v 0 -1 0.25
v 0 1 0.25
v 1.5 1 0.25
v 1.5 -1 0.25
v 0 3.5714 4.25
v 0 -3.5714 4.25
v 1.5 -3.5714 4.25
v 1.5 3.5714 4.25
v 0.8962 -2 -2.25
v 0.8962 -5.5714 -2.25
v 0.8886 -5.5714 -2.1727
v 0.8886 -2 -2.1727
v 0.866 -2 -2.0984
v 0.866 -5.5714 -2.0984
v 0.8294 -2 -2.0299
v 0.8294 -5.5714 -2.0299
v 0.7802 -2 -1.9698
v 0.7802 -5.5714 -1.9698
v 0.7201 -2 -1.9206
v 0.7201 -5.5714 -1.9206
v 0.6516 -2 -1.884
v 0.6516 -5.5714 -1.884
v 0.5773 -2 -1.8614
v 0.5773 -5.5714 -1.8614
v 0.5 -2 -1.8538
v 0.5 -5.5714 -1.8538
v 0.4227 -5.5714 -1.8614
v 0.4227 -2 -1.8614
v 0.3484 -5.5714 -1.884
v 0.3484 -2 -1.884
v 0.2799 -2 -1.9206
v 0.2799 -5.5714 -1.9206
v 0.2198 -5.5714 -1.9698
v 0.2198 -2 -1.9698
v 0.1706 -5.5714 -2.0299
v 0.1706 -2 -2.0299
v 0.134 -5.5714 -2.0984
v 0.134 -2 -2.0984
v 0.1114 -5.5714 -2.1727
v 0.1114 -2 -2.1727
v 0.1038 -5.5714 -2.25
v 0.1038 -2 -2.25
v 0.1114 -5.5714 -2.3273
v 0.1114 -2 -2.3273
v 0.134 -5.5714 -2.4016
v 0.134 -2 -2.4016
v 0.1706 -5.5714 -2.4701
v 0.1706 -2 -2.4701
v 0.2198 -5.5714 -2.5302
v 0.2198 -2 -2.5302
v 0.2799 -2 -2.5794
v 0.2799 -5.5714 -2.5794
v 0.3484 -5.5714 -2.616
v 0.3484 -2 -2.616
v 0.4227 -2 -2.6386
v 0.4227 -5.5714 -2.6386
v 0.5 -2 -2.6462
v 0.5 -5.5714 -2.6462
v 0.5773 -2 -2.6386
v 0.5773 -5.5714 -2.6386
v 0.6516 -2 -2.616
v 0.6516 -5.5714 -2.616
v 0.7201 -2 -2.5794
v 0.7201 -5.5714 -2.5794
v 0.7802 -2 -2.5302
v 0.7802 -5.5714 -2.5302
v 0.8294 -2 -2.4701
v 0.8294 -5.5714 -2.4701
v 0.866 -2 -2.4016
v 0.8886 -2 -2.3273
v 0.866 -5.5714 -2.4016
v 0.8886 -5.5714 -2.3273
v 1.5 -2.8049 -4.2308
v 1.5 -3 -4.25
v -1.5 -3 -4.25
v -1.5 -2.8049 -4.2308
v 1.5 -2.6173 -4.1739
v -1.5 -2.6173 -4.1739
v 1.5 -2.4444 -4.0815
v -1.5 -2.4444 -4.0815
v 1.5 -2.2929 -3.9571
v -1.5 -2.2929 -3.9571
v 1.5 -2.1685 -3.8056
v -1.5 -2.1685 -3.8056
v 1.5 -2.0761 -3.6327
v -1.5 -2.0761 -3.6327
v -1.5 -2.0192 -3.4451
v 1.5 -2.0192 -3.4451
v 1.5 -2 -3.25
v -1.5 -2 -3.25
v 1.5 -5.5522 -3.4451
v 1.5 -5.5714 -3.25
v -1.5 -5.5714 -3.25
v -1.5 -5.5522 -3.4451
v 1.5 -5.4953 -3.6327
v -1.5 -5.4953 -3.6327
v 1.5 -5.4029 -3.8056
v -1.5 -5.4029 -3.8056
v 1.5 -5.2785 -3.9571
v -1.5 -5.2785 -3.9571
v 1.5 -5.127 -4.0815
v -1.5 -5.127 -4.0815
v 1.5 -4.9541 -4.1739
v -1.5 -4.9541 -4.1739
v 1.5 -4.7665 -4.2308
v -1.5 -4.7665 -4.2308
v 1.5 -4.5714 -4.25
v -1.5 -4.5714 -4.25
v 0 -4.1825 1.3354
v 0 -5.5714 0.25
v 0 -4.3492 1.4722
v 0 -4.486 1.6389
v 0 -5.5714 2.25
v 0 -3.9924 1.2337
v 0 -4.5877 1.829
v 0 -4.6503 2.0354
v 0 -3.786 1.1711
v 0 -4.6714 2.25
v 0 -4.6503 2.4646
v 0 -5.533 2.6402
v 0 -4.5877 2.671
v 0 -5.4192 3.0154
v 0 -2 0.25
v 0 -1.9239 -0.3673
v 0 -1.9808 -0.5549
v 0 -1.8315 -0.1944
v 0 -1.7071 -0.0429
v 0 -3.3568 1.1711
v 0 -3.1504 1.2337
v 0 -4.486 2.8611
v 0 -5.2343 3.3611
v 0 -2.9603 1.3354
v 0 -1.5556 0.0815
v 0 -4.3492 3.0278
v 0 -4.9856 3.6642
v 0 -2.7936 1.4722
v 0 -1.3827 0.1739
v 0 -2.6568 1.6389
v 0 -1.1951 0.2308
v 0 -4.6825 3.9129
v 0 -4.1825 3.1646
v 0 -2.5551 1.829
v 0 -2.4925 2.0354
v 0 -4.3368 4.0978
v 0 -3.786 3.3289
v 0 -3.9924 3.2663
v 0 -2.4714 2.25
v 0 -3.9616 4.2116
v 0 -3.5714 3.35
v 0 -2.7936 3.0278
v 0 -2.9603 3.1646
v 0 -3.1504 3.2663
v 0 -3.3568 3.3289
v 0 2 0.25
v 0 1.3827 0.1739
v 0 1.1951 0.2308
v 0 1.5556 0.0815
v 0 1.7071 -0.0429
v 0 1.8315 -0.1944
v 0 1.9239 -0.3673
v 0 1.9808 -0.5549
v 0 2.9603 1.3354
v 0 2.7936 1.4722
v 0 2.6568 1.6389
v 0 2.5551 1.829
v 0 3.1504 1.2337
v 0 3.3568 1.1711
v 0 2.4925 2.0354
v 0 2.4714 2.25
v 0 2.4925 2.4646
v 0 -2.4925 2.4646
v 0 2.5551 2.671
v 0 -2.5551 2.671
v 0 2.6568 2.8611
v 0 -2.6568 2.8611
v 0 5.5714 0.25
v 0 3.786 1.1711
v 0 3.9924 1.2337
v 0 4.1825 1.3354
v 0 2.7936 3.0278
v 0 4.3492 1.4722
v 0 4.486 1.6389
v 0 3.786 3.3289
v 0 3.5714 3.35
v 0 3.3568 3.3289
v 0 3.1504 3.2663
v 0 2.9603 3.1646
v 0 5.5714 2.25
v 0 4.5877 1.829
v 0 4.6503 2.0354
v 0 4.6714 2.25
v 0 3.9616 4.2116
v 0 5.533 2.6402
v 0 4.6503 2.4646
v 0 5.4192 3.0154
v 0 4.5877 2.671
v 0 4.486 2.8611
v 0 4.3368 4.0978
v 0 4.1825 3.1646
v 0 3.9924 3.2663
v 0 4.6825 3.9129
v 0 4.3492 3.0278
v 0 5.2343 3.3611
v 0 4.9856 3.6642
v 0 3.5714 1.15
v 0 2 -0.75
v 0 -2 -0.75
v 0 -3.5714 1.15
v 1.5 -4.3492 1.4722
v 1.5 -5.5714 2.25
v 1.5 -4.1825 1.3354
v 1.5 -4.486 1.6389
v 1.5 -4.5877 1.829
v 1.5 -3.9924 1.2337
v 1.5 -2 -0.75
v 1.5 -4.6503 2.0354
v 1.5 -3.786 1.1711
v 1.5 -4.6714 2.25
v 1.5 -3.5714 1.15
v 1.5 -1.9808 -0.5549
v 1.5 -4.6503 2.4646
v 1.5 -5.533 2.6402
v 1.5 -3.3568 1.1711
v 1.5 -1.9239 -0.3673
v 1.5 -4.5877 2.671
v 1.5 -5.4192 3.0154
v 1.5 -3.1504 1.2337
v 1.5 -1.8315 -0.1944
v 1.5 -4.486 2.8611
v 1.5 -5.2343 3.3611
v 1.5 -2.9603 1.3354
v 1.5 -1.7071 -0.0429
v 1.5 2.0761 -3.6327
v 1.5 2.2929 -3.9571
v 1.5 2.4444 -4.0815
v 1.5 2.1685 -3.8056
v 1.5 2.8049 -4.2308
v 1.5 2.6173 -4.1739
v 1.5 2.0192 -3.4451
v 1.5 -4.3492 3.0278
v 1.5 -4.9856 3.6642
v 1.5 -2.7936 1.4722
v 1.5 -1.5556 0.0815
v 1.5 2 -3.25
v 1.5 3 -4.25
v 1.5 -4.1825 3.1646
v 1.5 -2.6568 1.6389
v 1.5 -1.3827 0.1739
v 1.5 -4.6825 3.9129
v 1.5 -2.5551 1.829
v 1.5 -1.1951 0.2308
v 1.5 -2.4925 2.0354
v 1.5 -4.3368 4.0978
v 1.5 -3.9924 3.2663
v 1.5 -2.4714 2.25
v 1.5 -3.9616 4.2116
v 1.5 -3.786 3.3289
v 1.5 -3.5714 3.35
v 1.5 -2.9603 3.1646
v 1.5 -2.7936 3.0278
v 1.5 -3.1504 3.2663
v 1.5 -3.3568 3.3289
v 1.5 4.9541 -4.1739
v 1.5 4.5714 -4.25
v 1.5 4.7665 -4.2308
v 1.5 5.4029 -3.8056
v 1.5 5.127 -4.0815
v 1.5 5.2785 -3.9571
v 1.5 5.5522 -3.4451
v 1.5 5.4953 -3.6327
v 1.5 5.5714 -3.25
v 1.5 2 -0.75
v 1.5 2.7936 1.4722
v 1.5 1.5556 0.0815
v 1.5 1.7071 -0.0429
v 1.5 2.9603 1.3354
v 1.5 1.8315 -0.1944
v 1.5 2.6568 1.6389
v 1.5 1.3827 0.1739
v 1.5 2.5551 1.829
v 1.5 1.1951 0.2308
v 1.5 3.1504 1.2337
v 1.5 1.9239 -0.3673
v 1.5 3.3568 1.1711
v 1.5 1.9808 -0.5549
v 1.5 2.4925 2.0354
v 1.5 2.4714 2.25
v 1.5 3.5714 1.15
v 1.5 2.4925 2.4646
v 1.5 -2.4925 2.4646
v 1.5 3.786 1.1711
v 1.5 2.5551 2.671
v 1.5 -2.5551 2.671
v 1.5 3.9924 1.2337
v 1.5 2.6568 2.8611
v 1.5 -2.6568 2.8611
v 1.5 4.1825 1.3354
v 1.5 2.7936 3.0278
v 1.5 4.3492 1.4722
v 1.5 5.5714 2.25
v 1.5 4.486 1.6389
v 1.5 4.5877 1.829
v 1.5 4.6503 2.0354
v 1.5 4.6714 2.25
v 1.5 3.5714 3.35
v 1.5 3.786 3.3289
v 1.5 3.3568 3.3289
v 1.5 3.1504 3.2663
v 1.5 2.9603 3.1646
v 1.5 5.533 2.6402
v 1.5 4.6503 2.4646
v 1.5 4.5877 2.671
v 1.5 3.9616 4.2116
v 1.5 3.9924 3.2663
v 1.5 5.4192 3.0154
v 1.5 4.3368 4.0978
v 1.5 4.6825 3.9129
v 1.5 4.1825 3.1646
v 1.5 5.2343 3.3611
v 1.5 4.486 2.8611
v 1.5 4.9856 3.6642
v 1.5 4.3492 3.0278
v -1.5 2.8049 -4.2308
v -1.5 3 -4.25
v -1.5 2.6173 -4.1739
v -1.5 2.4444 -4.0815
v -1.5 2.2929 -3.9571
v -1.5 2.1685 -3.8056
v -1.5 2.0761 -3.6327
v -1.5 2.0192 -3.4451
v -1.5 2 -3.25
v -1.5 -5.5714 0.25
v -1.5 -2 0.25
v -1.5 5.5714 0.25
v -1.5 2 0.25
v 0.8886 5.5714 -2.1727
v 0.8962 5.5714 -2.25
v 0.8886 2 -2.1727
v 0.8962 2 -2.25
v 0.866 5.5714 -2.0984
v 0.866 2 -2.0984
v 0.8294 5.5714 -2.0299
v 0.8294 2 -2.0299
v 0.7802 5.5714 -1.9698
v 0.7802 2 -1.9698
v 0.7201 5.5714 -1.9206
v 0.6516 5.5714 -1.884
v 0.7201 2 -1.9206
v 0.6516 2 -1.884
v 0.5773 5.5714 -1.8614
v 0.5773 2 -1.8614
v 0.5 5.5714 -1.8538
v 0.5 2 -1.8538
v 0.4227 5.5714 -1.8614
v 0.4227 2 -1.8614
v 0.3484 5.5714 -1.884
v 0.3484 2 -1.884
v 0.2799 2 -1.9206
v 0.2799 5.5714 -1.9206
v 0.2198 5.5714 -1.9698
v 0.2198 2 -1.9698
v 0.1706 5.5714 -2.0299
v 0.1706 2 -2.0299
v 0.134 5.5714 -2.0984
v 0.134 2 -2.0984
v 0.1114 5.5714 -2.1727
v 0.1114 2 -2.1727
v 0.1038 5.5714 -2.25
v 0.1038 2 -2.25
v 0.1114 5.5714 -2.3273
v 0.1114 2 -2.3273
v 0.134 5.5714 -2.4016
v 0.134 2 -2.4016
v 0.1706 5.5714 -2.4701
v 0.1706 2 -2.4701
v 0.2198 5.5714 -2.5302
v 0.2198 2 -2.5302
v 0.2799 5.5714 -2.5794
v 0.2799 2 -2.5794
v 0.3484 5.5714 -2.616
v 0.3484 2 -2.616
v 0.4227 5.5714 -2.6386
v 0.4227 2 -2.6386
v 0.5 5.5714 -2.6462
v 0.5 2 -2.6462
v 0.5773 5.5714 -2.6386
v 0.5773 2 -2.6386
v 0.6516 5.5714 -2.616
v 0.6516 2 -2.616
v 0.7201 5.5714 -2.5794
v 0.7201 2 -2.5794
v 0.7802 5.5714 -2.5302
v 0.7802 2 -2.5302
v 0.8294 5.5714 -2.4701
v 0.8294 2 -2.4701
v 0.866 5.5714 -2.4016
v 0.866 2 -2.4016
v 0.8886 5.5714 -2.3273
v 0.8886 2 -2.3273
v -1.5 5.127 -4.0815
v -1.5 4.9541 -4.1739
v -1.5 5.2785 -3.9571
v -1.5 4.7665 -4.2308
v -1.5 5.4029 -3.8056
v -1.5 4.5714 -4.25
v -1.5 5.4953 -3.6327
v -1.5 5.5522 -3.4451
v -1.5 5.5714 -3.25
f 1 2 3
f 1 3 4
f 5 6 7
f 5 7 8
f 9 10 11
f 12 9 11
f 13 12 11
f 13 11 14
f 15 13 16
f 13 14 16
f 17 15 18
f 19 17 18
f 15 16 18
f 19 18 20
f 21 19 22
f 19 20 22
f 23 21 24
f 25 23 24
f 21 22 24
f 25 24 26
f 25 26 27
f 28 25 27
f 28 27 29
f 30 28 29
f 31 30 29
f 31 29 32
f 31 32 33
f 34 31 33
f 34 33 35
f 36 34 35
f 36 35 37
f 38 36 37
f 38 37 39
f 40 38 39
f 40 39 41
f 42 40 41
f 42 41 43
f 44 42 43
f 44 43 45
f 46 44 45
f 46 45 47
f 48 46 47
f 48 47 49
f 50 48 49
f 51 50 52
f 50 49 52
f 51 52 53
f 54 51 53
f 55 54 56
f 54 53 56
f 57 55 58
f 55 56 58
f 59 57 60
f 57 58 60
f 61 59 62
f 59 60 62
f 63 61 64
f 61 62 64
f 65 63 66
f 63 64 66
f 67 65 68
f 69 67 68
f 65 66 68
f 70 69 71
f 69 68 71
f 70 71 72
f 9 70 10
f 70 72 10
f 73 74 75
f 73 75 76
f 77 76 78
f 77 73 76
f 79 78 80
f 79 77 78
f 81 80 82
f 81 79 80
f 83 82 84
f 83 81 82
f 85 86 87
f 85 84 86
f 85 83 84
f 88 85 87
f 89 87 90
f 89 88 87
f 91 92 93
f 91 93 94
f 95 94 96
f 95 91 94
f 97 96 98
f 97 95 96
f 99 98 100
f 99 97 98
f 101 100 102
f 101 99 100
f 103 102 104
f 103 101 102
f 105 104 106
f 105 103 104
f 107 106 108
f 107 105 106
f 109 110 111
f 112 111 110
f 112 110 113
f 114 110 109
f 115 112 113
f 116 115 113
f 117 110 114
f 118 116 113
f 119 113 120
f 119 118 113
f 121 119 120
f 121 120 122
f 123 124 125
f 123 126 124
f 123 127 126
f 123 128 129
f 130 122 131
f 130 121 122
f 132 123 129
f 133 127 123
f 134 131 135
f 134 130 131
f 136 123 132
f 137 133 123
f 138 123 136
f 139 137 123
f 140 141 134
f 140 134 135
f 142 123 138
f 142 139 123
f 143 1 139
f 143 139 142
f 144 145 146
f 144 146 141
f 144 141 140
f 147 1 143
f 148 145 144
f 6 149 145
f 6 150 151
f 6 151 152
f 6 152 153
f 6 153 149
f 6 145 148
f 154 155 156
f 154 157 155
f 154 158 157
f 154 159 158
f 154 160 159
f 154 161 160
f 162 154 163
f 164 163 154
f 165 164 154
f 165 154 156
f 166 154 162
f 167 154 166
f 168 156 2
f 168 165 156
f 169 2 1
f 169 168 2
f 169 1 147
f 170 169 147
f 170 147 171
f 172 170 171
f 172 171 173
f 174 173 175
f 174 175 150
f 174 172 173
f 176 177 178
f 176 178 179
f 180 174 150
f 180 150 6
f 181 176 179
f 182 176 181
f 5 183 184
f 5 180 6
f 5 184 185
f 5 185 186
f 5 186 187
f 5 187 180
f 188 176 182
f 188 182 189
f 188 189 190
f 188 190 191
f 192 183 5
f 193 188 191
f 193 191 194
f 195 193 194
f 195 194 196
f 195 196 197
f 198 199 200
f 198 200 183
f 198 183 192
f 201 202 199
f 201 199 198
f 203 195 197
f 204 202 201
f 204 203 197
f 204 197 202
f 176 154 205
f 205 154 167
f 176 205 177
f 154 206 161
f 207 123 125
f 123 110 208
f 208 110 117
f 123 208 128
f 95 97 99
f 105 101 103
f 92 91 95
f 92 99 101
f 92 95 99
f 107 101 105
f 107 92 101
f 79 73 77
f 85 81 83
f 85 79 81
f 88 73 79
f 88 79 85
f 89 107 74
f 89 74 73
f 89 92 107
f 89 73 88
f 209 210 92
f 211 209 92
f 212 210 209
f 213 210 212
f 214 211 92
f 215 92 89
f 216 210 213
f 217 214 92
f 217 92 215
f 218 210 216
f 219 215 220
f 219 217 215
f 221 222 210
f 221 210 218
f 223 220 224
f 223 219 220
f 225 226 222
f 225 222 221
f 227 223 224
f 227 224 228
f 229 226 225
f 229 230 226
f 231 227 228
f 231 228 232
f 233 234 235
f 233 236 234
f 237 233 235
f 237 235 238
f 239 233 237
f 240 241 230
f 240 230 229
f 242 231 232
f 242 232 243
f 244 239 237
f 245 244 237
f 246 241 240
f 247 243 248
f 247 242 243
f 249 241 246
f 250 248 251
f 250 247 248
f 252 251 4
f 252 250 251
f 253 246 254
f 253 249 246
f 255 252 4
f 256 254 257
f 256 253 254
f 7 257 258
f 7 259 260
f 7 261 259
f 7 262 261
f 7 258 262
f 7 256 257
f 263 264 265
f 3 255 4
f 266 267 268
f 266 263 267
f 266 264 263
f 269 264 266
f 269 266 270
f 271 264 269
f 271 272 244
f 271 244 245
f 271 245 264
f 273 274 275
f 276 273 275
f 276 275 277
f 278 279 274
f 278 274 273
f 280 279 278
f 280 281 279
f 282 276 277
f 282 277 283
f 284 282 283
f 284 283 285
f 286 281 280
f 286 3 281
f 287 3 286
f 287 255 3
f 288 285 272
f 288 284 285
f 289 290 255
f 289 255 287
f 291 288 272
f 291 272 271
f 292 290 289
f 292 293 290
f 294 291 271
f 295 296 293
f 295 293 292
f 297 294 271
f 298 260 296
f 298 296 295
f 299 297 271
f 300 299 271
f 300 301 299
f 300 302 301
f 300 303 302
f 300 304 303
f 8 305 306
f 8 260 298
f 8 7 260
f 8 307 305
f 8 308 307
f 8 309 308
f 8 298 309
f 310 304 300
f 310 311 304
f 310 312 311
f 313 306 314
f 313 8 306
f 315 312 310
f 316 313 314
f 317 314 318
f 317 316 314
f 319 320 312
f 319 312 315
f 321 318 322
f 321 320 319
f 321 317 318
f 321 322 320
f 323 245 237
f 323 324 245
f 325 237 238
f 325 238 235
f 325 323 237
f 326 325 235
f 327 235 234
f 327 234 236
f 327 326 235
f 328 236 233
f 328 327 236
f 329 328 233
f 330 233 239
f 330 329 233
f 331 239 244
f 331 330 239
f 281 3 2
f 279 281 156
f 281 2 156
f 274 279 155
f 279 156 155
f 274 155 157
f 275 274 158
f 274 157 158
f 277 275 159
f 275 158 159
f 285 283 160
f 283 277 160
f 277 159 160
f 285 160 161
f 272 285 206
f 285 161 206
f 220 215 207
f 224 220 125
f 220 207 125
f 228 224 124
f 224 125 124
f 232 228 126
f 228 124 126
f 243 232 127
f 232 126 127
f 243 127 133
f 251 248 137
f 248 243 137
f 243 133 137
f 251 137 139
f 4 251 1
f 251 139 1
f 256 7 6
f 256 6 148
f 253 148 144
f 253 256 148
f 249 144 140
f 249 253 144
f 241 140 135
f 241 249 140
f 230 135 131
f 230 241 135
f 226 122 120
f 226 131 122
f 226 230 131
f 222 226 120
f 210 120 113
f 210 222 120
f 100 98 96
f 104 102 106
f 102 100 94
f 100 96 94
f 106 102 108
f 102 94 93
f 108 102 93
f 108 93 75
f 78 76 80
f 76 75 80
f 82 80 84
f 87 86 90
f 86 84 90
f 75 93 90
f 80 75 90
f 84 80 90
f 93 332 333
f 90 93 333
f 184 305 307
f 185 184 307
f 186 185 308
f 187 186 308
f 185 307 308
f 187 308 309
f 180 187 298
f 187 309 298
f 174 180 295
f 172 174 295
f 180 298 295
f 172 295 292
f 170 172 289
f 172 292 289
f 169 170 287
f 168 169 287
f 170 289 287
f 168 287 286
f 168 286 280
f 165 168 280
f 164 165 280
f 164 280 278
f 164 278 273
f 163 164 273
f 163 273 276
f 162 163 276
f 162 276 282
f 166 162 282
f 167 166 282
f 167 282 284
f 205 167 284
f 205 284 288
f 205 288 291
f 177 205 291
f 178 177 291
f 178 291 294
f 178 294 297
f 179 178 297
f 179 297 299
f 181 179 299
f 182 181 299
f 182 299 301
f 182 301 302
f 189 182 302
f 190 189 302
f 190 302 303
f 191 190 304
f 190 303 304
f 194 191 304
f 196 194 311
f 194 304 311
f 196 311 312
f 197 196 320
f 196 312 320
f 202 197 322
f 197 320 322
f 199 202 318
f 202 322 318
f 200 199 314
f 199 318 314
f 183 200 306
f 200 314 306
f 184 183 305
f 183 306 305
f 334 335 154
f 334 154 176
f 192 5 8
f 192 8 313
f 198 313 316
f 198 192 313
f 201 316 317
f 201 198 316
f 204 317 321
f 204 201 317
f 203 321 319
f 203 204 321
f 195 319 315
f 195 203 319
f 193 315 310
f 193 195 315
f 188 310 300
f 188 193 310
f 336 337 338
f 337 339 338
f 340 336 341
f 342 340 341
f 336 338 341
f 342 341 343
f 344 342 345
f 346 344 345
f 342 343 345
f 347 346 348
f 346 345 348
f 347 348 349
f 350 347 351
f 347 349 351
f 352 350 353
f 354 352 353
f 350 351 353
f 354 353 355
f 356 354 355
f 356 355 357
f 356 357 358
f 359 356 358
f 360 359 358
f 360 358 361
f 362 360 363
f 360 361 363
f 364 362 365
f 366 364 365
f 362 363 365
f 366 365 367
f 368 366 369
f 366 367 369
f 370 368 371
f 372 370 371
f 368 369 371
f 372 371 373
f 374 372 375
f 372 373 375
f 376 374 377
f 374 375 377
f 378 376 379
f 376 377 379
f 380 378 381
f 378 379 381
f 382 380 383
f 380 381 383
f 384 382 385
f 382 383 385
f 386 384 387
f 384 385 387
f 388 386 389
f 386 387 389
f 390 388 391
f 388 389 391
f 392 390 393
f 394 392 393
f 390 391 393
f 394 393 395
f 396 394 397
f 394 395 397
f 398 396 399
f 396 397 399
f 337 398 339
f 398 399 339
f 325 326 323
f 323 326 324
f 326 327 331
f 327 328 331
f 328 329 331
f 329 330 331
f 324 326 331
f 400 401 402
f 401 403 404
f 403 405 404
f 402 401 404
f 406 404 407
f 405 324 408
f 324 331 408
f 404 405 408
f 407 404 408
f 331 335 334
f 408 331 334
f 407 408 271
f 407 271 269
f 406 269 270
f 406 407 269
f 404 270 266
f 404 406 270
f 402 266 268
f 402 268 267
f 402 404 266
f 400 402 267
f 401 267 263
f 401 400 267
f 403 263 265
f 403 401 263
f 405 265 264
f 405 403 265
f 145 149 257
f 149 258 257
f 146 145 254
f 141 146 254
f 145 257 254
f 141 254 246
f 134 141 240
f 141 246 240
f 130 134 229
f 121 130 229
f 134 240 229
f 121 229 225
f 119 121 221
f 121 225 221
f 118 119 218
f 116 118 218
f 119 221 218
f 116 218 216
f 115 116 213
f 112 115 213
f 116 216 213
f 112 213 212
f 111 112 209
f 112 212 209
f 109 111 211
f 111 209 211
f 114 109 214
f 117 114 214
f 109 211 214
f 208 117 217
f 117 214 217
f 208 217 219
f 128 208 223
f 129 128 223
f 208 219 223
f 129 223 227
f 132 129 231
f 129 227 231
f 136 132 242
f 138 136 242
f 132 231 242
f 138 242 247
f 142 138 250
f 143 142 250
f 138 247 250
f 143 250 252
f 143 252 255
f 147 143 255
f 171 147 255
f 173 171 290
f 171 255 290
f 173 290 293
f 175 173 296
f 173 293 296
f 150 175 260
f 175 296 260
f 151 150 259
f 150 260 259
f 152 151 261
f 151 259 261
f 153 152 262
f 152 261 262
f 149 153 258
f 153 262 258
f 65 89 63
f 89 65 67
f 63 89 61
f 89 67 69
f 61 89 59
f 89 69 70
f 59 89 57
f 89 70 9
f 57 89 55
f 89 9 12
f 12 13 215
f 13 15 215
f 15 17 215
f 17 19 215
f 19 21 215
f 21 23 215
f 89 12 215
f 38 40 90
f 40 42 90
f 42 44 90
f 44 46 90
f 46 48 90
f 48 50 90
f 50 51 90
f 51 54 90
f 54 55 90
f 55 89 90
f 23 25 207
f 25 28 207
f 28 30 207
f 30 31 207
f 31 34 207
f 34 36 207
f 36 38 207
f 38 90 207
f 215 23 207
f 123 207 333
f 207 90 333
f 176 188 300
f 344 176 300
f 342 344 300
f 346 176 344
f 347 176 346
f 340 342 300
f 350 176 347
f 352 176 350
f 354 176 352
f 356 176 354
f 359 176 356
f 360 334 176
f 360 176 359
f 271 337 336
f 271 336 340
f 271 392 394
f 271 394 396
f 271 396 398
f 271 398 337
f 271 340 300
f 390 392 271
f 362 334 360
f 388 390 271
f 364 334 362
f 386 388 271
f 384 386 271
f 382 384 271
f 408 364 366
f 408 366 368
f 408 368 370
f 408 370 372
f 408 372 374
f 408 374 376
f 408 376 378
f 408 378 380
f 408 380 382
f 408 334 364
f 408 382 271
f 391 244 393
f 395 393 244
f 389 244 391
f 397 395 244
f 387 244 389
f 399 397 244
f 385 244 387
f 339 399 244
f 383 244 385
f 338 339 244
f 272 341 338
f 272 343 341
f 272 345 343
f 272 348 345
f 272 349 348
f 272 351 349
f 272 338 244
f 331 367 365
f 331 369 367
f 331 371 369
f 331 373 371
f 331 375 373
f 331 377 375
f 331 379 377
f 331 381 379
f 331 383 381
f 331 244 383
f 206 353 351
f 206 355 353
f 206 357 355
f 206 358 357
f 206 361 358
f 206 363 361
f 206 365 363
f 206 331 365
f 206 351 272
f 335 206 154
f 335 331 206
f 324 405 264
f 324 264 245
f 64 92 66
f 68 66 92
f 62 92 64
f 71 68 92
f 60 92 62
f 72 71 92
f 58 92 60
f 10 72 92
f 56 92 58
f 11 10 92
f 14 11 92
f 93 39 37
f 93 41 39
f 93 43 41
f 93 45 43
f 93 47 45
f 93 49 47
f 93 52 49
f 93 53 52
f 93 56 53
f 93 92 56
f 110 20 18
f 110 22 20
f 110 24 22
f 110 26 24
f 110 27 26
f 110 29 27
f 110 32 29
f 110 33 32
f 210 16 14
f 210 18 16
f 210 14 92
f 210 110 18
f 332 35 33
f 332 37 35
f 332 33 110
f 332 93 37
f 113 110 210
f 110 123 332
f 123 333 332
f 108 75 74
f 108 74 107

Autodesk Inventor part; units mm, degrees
ref_plane "YZ Plane" through (0, 0, 0) normal (1, 0, 0) x (0, 1, 0)
ref_plane "XZ Plane" through (0, 0, 0) normal (0, 1, 0) x (-1, 0, 0)
ref_plane "XY Plane" through (0, 0, 0) normal (0, 0, 1) x (1, 0, 0)
sketch "Sketch1" plane through (0, 0, 0) normal (1, 0, 0) x (0, 1, 0)
  line L0 (-5.5714, 4.25) -> (5.5714, 4.25)
  line L1 (5.5714, 4.25) -> (5.5714, -4.25)
  line L2 (5.5714, -4.25) -> (-5.5714, -4.25)
  line L3 (-5.5714, -4.25) -> (-5.5714, 4.25)
  line L4 (-5.5714, 0.25) -> (5.5714, 0.25) construction
  circle A0 centre (-3.5714, 2.25) radius 2 construction
  line L5 (-2, -4.25) -> (2, -4.25)
  line L6 (2, -4.25) -> (2, 0.25)
  line L7 (2, 0.25) -> (-2, 0.25)
  line L8 (-2, 0.25) -> (-2, -4.25)
  circle A1 centre (3.5714, 2.25) radius 2 construction
  circle A2 centre (0, 36.35) radius 39 construction
  line L9 (-5.5714, -2.25) -> (5.5714, -2.25) construction
  point P0 (0, 0)
  point P1 (-5.5714, 0)
  point P2 (0, -4.25)
  dimension "d0" = 4
  dimension "d1" = 4.5
  dimension "d2" = 11.1427
  dimension "d15" = 4
  dimension "d34" = 78
  dimension "d35" = 38.6
  dimension "d36" = 4.5
extrude "Extrusion1" add sketch "Sketch1" along normal mid plane 3 contours L0 L1 L2 L6 L7 L8 L3
sketch "Sketch4" plane through (-1.5, -5.5714, -4.25) normal (0, -1, 0) x (1, 0, 0)
  line L0 (0, 8.5) -> (3, 8.5) projected
  line L1 (0, 0) -> (0, 8.5) projected
  line L2 (3, 0) -> (0, 0) projected
  line L3 (3, 8.5) -> (3, 0) projected
  circle A0 centre (2, 2) radius 0.3962
  point P0 (1.5, 4.25)
  dimension "d16" = 0.7925
  dimension "d24" = 2
  dimension "d25" = 6.5
extrude "Extrusion3" cut sketch "Sketch4" against normal through all contours A0
fillet "Fillet1" radius 1 6 edges at (0, 2, 0.25) (0, -2, 0.25) (0, 2, -4.25) (0, -2, -4.25) (0, 5.5714, -4.25) (0, -5.5714, -4.25)
fillet "Fillet1" radius 2 2 edges at (0, 5.5714, 4.25) (0, -5.5714, 4.25)
sketch "Sketch5" plane through (-1.5, 0, 0) normal (-1, 0, 0) x (0, 0, 1)
  line L0 (-0.75, -2) -> (-3.25, -2) projected
  line L1 (-4.25, -3) -> (-4.25, -4.5714) projected
  line L2 (-3.25, -5.5714) -> (2.25, -5.5714) projected
  line L3 (4.25, -3.5714) -> (4.25, 3.5714) projected
  line L4 (2.25, 5.5714) -> (-3.25, 5.5714) projected
  line L5 (-4.25, 4.5714) -> (-4.25, 3) projected
  line L6 (-3.25, 2) -> (-0.75, 2) projected
  arc A0 (0.25, 1) -> (-0.75, 2) centre (-0.75, 1) ccw projected
  line L7 (0.25, 1) -> (0.25, -1) projected
  arc A1 (-0.75, -2) -> (0.25, -1) centre (-0.75, -1) ccw projected
  line L8 (-0.75, -2) -> (-3.25, -2) projected
  line L9 (-0.75, -2) -> (0.25, -2)
  arc A2 (-0.75, -2) -> (0.25, -1) centre (-0.75, -1) ccw projected
  line L10 (0.25, -2) -> (0.25, -5.5714)
  line L11 (-0.75, 2) -> (0.25, 2)
  line L12 (0.25, 2) -> (0.25, 5.5714)
  line L13 (2.25, 5.5714) -> (-3.25, 5.5714) projected
  line L14 (0.25, 1) -> (0.25, -1) projected
  arc A3 (4.25, 3.5714) -> (2.25, 5.5714) centre (2.25, 3.5714) ccw projected
  arc A4 (2.25, -5.5714) -> (4.25, -3.5714) centre (2.25, -3.5714) ccw projected
  arc A5 (-3.25, 5.5714) -> (-4.25, 4.5714) centre (-3.25, 4.5714) ccw projected
  arc A6 (-4.25, 3) -> (-3.25, 2) centre (-3.25, 3) ccw projected
  arc A7 (-3.25, -2) -> (-4.25, -3) centre (-3.25, -3) ccw projected
  arc A8 (-4.25, -4.5714) -> (-3.25, -5.5714) centre (-3.25, -4.5714) ccw projected
  point P0 (0, 0)
  point P1 (4.25, 7)
  point P2 (-4.25, 7)
extrude "Extrusion4" cut sketch "Sketch5" against normal blind 1.5 contours A1 L7 A0 L11 L12 L4 A3 L3 A4 L2 L10 L9
hole "Hole2" at (0, -3.5714, 2.25) at (0, 3.5714, 2.25) direction (1, 0, 0) diameter 2.2 end through all clearance for "Flat Head Machine Screw" size "M2" standard "Ansi Metric M Profile"
properties part number "+XPanel_AntennaMount" material "Acetal Resin, Black"
